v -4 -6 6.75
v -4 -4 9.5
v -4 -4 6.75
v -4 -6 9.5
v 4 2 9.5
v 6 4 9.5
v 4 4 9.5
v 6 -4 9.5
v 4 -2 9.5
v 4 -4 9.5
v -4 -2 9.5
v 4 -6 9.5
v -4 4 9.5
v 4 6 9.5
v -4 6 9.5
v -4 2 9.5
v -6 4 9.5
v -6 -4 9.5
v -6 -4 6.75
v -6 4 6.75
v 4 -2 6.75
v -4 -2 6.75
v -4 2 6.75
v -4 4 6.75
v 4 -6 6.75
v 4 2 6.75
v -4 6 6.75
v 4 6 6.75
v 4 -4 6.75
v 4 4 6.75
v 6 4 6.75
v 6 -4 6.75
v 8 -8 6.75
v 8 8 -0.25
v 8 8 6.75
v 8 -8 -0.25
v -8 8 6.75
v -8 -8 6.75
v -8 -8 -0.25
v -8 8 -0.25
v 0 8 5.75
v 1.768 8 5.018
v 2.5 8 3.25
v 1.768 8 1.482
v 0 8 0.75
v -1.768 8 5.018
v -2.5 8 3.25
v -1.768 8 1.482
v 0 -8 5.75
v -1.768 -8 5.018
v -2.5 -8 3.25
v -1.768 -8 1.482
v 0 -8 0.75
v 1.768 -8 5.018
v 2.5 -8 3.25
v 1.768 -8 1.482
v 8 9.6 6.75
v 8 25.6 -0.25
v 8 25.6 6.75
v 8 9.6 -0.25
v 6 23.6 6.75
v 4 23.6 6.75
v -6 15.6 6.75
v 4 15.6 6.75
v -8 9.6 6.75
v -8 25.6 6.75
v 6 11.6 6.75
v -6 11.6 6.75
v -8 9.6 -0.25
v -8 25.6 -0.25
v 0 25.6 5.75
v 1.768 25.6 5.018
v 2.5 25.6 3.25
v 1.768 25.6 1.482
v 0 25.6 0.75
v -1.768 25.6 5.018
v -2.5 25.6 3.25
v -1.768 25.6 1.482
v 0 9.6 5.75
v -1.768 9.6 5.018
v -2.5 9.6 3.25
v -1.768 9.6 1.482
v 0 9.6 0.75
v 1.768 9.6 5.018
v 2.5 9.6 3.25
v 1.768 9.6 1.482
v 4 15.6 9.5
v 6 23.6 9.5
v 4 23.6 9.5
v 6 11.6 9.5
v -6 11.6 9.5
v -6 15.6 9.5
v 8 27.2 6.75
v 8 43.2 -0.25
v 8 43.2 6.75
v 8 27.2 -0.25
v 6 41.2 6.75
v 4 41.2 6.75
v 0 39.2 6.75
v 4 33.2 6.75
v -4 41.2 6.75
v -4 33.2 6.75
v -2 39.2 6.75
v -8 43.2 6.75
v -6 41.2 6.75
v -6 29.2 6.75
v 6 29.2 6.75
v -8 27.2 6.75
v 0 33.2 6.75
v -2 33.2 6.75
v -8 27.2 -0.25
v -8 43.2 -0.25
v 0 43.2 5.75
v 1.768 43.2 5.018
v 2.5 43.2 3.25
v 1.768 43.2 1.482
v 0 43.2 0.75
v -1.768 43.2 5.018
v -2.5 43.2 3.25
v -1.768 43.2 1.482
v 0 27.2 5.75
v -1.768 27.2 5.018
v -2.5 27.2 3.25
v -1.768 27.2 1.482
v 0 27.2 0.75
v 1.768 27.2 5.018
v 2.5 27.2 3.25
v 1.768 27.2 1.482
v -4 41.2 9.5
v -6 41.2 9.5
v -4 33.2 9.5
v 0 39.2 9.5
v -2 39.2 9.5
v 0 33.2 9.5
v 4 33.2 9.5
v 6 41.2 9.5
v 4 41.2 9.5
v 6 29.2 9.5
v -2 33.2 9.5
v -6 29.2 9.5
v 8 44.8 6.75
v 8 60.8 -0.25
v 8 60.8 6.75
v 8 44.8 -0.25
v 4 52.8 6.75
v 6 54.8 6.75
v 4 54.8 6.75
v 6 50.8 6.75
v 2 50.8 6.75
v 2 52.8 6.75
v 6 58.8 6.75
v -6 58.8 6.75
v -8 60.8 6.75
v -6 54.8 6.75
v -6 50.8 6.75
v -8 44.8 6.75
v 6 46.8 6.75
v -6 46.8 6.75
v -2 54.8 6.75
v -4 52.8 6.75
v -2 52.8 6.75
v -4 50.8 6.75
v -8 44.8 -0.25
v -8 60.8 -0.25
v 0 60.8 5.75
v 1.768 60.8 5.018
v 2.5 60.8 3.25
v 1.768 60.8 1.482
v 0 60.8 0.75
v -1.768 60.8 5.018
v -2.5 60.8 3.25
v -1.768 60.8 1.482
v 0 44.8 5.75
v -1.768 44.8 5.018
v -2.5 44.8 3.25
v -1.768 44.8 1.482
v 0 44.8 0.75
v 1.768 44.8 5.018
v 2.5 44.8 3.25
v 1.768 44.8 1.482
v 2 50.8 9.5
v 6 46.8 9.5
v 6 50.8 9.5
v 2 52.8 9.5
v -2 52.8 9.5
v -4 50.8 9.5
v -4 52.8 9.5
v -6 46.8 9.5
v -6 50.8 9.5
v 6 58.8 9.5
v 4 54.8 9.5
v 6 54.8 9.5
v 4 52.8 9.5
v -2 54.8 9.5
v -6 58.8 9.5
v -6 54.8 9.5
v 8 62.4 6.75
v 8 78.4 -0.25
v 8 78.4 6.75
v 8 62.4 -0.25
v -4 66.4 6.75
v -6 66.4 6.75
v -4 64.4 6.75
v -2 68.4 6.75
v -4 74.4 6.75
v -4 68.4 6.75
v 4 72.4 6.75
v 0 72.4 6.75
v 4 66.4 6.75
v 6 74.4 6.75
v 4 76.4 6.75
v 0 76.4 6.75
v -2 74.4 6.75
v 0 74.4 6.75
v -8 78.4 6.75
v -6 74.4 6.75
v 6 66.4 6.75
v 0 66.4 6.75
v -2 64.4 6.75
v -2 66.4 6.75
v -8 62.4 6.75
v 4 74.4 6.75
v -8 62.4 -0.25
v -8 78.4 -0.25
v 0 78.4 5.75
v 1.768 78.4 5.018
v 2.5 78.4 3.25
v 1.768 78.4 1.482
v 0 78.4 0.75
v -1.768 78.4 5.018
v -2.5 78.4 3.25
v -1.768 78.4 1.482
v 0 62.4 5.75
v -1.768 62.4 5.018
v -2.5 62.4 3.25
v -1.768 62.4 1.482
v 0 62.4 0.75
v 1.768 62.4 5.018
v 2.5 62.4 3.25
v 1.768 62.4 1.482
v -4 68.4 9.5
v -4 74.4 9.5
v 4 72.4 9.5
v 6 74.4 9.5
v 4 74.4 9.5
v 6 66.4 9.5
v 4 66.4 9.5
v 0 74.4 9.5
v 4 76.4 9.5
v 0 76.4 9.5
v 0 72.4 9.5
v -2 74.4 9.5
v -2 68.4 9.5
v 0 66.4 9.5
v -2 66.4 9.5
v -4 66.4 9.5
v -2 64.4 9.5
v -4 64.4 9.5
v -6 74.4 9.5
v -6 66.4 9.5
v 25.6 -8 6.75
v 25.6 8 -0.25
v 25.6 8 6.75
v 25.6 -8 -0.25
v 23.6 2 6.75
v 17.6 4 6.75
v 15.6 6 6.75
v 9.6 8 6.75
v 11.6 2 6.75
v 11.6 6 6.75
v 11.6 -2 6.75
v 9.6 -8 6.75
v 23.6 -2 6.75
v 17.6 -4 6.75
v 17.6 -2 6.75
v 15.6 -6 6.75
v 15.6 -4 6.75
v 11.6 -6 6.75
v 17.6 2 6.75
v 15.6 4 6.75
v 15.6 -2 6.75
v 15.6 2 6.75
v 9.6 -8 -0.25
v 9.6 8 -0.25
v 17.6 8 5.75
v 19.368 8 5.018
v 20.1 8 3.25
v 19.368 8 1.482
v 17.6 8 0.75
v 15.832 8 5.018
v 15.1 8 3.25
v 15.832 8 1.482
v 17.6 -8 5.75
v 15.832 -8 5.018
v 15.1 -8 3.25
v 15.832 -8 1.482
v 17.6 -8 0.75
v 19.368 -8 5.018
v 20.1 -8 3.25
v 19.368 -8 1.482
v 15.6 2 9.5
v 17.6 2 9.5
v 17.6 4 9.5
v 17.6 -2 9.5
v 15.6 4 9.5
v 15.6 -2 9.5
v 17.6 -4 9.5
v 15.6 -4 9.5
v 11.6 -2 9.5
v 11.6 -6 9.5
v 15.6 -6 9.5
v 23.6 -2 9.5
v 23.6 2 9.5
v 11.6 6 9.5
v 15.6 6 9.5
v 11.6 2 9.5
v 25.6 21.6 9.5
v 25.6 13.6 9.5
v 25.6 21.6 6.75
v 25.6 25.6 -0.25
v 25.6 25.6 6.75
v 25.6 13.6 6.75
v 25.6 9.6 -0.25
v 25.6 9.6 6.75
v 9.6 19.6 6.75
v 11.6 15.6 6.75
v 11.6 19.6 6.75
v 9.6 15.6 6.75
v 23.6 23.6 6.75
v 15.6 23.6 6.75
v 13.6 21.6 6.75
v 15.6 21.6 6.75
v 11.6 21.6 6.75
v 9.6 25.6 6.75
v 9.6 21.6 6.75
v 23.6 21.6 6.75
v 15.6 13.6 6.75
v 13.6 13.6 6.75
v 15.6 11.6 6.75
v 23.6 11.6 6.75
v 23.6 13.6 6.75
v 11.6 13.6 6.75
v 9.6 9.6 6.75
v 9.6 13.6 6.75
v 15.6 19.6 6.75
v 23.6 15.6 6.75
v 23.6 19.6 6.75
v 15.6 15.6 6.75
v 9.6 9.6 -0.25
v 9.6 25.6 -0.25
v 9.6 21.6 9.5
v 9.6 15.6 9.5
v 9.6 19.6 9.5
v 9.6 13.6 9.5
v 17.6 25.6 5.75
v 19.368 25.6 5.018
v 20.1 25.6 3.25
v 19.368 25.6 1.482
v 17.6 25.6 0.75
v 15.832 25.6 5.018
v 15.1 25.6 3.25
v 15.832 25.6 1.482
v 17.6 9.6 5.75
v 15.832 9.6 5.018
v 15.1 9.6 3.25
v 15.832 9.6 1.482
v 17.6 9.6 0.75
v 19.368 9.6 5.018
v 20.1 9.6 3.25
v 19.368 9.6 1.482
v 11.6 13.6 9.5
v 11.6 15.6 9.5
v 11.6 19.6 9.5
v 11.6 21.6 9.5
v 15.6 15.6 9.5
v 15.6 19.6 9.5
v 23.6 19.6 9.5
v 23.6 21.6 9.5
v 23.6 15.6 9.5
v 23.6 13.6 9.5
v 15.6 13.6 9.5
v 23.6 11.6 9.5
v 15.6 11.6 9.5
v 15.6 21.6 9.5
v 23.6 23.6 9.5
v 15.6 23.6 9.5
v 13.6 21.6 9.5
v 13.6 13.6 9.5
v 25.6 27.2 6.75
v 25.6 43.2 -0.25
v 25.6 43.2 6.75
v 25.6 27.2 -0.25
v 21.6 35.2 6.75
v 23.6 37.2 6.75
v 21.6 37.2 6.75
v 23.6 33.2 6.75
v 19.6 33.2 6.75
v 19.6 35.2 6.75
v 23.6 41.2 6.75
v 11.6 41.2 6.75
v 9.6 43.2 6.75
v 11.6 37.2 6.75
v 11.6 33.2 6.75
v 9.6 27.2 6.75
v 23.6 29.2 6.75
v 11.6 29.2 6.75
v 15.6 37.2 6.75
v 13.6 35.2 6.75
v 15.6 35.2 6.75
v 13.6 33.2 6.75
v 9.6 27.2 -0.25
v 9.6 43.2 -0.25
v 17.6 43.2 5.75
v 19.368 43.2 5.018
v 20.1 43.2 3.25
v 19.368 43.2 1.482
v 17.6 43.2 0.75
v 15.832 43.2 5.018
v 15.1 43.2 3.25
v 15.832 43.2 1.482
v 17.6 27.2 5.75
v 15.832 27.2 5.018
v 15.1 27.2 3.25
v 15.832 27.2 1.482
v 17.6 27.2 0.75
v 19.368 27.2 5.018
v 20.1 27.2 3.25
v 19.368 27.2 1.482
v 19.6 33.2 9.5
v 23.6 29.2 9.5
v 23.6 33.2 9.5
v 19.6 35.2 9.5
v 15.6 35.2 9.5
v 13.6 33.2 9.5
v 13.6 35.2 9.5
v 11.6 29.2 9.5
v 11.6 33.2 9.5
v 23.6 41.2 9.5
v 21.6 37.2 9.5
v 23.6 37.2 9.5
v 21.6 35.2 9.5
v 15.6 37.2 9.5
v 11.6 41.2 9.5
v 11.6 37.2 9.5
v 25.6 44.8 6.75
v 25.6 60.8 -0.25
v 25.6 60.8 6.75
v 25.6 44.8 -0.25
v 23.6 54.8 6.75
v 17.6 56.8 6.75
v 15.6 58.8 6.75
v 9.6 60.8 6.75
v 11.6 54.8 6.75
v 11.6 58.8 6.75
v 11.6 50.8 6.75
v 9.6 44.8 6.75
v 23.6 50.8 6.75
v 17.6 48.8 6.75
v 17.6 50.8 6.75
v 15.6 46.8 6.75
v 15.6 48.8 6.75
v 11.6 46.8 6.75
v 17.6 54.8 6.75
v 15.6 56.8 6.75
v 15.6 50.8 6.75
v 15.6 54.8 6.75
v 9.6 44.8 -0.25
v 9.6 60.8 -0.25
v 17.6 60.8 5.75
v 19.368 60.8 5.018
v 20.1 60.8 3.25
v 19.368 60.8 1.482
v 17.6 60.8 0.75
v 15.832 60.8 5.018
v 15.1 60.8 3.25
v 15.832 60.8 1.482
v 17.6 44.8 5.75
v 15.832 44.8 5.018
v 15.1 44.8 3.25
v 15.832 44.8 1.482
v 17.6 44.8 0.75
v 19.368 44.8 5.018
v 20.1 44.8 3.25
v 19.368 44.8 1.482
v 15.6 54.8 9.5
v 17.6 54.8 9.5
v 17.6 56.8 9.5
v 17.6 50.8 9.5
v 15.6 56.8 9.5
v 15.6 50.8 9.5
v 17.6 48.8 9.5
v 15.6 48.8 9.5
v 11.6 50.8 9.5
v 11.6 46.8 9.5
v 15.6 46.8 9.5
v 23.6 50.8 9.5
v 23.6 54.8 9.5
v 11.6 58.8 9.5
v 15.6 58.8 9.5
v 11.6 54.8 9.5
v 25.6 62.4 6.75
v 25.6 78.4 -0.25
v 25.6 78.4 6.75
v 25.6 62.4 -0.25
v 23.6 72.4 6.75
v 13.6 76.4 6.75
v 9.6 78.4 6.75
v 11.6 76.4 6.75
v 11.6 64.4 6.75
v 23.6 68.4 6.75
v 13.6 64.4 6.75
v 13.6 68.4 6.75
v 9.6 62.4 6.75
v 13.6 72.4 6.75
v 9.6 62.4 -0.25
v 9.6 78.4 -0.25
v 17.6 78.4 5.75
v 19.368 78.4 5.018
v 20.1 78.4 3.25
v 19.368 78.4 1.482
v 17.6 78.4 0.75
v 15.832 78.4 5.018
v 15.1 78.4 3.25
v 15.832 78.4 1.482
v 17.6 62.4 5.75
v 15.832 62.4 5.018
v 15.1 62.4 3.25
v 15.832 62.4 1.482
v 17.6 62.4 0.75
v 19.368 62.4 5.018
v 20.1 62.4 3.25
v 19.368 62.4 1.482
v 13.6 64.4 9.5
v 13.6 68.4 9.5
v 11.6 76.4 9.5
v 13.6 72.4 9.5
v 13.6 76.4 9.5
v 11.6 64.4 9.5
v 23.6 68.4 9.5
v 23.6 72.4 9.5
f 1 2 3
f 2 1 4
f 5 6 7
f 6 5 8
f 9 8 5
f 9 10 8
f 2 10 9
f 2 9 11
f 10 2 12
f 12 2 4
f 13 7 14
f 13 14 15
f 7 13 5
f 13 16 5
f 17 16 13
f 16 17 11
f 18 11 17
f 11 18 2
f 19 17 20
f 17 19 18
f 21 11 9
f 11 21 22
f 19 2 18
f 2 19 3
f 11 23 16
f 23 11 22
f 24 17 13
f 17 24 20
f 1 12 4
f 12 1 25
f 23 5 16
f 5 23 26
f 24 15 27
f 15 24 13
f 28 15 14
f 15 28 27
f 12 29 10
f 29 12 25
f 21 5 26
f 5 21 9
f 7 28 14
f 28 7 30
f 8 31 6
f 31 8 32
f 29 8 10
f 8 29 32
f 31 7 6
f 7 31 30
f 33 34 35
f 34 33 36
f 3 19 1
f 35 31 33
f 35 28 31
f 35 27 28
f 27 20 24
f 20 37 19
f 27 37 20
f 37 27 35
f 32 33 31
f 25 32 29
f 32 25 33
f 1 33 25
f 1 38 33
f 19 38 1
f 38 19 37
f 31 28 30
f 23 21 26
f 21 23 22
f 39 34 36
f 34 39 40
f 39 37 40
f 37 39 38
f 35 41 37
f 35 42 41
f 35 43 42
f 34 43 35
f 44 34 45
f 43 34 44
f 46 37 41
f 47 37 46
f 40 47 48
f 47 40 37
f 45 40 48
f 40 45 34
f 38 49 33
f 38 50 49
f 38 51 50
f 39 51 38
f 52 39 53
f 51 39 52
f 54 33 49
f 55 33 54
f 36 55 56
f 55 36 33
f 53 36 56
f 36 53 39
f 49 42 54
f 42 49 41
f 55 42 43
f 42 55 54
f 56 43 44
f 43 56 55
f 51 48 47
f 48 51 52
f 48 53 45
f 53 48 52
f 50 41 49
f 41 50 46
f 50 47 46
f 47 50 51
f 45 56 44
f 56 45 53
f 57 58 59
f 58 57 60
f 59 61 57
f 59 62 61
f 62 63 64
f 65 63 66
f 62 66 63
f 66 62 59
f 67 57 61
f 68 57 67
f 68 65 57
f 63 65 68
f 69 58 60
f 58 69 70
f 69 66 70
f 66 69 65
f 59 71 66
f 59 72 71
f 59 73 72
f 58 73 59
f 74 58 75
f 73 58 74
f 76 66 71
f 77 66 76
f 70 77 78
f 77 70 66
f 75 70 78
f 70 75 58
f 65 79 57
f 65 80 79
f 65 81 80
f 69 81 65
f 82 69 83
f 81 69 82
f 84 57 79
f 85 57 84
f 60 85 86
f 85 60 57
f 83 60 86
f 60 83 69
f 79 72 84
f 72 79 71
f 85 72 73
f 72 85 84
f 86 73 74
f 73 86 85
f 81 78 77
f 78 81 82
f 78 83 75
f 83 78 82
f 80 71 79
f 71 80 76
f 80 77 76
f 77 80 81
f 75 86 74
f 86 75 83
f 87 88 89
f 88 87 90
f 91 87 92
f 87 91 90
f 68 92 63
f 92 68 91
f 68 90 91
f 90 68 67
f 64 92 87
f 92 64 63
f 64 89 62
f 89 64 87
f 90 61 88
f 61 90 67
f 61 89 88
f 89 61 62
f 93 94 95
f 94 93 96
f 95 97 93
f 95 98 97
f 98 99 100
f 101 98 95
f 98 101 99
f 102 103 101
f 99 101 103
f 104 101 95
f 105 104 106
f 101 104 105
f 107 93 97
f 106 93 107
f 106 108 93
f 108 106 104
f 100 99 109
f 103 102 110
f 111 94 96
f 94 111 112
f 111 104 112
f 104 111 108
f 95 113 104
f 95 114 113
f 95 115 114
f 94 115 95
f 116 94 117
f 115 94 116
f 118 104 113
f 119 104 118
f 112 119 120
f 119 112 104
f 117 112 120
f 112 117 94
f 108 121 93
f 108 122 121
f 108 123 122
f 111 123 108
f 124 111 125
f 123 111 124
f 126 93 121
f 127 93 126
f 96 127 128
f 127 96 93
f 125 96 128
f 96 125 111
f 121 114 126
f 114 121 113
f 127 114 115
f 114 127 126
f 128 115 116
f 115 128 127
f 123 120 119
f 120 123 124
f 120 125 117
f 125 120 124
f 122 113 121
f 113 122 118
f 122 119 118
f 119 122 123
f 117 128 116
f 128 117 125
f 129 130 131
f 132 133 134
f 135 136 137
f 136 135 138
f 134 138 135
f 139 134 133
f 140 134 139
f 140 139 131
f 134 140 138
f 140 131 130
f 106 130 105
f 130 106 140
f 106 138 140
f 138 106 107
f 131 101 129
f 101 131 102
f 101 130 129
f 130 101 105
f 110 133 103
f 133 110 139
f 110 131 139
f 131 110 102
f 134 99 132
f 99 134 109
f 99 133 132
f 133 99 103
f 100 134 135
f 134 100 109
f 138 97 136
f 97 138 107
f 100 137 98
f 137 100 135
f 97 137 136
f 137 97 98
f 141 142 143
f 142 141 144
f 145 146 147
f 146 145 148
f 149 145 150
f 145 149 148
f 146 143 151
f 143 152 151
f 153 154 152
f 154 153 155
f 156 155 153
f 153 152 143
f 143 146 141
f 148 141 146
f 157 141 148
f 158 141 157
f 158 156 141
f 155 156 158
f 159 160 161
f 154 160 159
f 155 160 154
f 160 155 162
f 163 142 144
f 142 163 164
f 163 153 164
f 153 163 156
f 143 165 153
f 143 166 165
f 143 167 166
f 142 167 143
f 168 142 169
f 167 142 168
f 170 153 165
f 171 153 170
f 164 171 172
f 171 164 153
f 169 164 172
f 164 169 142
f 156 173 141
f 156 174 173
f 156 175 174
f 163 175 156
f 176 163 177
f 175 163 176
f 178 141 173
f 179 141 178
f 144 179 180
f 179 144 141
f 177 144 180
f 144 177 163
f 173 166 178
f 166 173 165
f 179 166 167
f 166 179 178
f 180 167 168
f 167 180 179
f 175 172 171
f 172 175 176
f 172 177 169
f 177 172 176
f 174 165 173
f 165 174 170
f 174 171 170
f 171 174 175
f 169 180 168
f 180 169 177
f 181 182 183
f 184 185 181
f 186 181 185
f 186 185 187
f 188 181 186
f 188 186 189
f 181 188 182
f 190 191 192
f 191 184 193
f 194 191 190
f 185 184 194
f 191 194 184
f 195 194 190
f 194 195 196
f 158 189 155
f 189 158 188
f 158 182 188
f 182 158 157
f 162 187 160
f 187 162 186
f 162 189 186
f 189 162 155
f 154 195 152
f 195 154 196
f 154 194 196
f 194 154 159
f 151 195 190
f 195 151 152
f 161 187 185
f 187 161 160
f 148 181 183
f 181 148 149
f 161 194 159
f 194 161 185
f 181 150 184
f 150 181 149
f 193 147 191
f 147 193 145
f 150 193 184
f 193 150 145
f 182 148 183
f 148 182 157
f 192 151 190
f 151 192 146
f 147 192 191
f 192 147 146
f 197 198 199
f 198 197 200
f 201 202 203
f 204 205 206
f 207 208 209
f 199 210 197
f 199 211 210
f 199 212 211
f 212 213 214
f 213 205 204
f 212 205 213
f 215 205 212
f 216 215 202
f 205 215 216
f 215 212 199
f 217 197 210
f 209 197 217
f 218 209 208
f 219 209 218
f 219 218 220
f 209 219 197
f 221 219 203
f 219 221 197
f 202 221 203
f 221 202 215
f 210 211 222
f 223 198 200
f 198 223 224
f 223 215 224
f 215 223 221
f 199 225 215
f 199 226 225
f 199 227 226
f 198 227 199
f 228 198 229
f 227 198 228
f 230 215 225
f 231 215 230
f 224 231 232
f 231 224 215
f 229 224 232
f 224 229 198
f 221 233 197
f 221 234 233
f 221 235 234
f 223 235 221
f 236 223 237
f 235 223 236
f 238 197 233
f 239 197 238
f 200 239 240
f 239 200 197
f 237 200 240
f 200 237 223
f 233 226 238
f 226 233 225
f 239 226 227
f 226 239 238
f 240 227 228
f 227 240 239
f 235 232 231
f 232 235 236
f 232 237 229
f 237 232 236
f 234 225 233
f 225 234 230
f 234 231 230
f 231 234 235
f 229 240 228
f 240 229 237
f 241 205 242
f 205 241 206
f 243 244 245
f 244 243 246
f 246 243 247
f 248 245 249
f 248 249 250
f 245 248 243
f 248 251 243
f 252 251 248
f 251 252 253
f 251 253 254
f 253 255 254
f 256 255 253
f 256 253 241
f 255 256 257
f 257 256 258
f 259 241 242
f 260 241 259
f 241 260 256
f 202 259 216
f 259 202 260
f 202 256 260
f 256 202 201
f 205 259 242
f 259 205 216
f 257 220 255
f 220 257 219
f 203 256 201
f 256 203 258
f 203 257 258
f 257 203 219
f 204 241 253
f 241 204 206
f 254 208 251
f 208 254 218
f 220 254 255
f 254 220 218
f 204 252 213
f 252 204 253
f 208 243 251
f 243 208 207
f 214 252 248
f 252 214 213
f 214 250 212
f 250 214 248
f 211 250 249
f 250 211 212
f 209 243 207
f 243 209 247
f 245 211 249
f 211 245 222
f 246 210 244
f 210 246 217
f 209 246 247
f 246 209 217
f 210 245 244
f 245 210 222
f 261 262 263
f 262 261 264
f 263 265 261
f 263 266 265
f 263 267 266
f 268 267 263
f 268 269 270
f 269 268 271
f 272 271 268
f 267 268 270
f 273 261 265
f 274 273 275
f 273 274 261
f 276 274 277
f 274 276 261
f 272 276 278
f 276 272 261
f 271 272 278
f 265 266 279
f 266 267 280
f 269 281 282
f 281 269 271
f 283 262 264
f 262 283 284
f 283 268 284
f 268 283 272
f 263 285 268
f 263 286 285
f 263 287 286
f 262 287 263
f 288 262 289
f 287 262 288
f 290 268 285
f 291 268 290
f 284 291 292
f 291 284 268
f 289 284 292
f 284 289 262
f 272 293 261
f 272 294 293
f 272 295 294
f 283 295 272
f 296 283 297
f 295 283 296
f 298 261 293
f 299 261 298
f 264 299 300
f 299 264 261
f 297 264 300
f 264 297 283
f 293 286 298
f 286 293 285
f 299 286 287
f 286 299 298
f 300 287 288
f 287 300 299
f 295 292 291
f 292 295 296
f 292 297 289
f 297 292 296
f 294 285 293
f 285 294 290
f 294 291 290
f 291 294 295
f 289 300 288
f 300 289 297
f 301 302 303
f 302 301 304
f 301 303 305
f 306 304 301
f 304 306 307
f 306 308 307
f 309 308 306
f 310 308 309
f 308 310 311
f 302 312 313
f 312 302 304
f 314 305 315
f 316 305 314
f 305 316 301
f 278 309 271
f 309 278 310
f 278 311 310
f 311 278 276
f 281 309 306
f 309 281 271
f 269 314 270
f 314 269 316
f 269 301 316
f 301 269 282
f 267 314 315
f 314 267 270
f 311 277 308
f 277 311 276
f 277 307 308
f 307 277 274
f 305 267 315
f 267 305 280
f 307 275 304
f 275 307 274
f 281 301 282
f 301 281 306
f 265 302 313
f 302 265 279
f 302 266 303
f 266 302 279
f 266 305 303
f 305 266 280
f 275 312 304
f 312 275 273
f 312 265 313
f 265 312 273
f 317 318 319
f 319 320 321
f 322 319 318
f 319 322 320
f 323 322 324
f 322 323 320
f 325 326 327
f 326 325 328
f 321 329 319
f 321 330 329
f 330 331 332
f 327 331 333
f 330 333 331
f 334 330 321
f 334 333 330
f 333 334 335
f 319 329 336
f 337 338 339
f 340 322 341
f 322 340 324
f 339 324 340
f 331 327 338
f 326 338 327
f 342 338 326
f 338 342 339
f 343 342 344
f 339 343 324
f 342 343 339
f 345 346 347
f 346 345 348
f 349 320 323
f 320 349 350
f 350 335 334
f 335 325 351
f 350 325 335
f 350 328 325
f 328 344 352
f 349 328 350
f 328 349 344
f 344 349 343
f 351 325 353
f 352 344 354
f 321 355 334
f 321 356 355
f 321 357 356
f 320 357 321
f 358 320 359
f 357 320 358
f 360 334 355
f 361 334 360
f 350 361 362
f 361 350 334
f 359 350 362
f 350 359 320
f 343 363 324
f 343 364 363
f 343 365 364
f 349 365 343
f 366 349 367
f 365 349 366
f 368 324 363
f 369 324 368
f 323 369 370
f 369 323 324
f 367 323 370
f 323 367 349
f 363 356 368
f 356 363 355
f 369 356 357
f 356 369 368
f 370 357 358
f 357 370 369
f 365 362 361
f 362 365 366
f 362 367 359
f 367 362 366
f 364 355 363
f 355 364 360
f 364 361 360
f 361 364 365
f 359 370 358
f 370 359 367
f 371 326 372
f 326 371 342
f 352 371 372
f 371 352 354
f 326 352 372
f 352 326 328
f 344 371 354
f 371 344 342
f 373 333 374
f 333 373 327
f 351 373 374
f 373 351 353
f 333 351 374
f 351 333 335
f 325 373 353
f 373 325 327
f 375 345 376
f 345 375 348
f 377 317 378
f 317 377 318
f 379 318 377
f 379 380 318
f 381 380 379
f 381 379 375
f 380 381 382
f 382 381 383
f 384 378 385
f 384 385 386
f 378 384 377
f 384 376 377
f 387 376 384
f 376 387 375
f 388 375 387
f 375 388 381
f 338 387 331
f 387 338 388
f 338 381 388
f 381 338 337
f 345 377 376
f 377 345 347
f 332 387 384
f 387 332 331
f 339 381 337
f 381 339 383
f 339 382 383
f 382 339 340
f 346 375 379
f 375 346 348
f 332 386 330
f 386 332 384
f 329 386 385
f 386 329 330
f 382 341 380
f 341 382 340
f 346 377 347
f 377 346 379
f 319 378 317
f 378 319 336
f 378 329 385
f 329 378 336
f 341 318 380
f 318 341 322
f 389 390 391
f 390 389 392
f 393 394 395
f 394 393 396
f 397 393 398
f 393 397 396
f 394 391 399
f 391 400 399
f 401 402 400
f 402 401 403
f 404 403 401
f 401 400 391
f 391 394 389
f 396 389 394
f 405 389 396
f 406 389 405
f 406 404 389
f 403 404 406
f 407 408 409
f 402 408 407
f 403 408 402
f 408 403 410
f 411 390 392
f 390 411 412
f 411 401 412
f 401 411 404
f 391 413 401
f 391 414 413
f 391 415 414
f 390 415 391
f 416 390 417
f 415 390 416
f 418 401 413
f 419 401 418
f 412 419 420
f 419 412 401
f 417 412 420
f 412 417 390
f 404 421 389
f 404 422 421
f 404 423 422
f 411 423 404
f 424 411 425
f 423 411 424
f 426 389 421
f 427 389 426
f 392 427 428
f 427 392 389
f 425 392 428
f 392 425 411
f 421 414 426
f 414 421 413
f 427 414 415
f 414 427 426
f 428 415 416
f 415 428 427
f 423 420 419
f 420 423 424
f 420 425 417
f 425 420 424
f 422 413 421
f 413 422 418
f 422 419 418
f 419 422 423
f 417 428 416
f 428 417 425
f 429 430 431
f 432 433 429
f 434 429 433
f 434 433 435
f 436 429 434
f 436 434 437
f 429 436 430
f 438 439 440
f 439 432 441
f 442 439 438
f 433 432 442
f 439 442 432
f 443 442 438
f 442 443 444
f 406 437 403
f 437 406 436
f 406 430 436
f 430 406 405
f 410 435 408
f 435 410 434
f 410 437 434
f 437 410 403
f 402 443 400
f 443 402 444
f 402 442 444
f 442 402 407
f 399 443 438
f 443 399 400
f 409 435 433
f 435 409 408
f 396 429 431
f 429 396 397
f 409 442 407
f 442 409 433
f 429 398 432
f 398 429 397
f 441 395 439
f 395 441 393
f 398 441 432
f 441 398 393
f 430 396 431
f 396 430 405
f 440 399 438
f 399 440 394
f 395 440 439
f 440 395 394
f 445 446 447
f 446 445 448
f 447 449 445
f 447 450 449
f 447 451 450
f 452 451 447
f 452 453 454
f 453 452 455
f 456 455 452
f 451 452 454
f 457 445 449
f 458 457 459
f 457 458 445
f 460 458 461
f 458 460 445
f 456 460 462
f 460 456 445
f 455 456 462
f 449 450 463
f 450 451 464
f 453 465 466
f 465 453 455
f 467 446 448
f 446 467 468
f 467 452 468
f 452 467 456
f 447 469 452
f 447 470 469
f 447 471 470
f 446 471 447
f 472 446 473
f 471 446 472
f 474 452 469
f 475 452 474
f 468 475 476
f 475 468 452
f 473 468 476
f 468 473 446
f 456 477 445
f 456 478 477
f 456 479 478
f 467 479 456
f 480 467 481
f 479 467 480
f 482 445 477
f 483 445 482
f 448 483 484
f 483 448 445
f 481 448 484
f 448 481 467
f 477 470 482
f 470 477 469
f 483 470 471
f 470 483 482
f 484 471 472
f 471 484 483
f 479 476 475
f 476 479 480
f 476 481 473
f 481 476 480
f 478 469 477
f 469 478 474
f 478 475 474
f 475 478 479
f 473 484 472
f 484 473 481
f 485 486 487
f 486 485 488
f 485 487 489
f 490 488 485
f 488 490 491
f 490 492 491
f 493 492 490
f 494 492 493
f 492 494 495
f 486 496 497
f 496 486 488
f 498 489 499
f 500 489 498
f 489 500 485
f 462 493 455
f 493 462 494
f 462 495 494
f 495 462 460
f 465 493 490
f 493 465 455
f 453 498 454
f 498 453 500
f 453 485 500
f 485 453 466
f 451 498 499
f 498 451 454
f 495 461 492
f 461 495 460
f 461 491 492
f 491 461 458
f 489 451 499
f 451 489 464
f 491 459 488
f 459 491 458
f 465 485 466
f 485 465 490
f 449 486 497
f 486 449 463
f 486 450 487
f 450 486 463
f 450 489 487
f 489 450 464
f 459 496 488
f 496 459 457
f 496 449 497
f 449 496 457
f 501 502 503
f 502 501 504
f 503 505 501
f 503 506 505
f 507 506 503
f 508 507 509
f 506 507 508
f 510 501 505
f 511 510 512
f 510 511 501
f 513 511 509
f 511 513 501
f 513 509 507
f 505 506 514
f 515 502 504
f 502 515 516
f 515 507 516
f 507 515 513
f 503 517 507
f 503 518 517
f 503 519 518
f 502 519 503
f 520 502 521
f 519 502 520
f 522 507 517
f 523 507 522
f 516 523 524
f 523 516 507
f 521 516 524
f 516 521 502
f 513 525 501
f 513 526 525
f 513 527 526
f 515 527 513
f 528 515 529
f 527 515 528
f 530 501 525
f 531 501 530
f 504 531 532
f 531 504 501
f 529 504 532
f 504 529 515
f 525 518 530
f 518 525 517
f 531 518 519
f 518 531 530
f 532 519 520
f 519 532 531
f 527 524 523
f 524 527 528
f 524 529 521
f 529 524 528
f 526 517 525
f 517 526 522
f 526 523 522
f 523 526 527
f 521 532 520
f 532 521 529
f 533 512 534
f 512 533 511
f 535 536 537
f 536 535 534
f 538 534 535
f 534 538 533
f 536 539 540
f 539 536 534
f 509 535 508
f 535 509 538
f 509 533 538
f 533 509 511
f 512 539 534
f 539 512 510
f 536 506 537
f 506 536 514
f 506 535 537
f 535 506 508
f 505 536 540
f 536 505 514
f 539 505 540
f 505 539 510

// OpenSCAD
/*
Parametric letters for for a necklace
Elmo Mäntynen <elmo.mantynen@iki.fi>
LGPL 2.1
*/

use <bitmap.scad>

// change chars array and char_count
// OpenSCAD has no string or length methods :(
chars = ["M","a","k","e","r","B","o","t"];
char_count = 8;

// block size 1 will result in 8mm per letter
block_size = 2;
// height is the Z height of each letter
height = 3;

//Hole for the necklace
hole_diameter = 5;

module 8bit_str(chars, char_count, block_size, height) {
	echo(str("Total Width: ", block_size * 8 * char_count, "mm"));
	union() {
		for (count = [0:char_count-1]) {
			translate(v = [0, count * block_size * 8, 0]) {
				8bit_char(chars[count], block_size, height);
			}
		}
	}
}

module letter(char, block_size, height, hole_diameter) {
	union() {
		translate(v = [0,0, hole_diameter*1.3]) {
			8bit_char(char, block_size, height);
		}
		translate(v = [0,0,(hole_diameter*1.3)/2]) {
			color([0,0,1,1]) {
				difference() {
					cube(size = [block_size * 8, block_size * 8, hole_diameter+2], center = true);
					rotate([90, 0, 0]) cylinder(h = block_size * 8 + 1, r = hole_diameter/2, center = true);
				}
			}
		}
	}
}

matrix = [["O",  "L", "E", "N", "S"], 
		[ "Y", "OE", "N", "Y", "T"]];

union() {
	for (column = [0:1]) {
		for (row = [0:4]) {
			translate(v=[column*(block_size*1.1)*8, row*(block_size*1.1)*8, 0])
				letter(matrix[column][row], block_size, height, hole_diameter);
		}
	}	
}
